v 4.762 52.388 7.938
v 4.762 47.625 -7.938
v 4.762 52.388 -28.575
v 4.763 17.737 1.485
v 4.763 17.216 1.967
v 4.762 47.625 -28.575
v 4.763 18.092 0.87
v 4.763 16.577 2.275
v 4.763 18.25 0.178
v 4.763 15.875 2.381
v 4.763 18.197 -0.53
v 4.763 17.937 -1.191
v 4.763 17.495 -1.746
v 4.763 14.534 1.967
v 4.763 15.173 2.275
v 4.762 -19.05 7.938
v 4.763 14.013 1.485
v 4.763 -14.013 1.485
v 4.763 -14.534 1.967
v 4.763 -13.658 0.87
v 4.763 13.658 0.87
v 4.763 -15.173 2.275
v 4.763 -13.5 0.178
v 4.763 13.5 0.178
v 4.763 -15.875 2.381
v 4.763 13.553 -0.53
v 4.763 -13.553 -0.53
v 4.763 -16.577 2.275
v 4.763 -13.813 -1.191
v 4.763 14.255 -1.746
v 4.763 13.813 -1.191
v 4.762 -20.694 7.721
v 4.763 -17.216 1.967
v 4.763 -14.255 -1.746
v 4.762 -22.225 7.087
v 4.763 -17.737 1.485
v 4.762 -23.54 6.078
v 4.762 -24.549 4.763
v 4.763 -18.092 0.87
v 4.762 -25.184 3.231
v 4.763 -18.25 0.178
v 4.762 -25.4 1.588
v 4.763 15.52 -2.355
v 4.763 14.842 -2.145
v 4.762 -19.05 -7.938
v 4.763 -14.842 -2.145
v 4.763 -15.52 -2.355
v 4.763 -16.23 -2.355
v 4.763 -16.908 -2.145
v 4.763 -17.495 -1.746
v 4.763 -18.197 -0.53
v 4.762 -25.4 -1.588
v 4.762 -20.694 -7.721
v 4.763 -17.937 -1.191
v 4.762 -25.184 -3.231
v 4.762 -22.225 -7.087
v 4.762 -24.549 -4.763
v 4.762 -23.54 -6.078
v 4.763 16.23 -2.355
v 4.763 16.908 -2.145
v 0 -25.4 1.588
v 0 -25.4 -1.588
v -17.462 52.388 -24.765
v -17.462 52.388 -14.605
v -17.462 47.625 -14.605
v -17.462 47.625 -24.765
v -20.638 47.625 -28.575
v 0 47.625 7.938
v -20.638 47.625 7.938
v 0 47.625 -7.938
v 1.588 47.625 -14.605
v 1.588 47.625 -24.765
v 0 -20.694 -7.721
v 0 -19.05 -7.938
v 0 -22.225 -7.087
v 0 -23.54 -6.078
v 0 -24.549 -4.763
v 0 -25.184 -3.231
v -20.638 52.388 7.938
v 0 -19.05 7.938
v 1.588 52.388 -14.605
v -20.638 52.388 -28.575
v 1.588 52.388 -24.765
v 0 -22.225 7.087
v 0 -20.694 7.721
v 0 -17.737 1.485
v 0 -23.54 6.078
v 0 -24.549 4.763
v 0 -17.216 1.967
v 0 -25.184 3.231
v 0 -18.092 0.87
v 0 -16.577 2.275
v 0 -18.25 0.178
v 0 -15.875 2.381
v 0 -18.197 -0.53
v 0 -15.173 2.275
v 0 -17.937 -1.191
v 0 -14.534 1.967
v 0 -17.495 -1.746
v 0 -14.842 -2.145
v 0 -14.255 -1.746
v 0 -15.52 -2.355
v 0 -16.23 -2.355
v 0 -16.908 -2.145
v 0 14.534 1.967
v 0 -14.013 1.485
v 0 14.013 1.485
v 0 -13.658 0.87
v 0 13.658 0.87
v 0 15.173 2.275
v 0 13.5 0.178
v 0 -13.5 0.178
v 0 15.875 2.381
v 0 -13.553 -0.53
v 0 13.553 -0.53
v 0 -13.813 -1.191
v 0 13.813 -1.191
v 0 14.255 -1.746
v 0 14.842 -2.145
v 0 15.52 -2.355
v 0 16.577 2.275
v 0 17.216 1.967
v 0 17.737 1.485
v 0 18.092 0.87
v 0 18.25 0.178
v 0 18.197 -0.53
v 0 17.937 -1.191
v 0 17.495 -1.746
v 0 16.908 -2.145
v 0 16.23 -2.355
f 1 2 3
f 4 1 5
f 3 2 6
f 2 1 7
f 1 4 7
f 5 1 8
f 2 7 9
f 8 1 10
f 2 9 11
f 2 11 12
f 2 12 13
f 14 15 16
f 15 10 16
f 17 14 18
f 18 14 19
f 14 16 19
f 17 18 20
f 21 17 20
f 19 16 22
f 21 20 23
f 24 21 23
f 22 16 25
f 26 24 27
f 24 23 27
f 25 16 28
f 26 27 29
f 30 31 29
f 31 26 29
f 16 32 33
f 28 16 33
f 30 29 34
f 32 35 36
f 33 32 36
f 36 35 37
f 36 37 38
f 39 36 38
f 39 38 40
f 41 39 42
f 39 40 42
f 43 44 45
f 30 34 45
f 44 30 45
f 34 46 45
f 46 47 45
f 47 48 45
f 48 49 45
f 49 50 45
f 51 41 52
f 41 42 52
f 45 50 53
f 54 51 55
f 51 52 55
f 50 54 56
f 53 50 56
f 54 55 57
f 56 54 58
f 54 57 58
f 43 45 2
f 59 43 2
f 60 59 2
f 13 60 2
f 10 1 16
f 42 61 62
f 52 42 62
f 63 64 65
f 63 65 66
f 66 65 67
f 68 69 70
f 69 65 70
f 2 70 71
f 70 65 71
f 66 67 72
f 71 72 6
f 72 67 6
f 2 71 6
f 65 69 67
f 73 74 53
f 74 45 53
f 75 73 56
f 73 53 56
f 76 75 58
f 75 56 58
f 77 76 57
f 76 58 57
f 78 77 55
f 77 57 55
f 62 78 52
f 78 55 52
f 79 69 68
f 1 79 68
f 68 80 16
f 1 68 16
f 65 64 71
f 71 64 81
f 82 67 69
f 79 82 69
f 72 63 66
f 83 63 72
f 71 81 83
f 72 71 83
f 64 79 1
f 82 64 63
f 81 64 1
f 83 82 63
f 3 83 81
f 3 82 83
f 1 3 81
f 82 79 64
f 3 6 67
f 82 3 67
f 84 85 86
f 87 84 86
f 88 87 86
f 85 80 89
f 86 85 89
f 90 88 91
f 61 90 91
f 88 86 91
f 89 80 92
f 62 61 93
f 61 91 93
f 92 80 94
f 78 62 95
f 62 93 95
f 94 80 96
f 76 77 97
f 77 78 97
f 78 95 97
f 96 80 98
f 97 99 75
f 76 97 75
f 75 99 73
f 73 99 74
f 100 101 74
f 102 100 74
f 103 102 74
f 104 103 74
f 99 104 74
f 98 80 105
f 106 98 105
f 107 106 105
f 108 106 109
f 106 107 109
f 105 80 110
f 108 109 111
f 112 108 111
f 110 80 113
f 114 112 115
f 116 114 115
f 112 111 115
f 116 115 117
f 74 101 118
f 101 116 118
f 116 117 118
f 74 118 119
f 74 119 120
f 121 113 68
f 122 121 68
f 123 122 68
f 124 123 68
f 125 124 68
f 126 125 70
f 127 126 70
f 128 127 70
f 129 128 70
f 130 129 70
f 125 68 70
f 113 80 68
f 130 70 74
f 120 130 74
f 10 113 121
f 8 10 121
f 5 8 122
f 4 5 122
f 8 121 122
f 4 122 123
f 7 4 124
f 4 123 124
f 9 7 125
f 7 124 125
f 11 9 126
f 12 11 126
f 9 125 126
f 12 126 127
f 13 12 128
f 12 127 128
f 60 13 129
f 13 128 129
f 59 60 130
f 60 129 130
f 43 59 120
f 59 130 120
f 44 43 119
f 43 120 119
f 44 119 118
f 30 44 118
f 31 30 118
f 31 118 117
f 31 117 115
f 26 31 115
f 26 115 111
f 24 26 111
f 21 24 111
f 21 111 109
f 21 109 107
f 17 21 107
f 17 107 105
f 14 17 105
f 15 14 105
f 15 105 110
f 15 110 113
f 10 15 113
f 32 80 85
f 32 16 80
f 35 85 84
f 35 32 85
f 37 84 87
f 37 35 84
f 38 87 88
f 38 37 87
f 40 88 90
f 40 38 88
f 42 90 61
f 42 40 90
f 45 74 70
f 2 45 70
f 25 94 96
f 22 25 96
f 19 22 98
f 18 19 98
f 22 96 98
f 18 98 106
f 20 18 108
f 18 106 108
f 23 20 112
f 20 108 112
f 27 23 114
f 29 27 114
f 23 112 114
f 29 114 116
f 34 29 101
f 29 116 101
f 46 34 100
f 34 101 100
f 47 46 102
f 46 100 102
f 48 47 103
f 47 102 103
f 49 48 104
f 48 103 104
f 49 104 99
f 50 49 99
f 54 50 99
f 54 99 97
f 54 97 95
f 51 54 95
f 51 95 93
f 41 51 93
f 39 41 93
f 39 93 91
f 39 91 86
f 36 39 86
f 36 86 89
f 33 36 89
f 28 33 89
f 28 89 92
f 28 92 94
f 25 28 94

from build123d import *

# Parameters (mm, degrees)
SKETCH1_W                      = 15.875
SKETCH1_H                      = 22.225
SKETCH1_H_2                    = 50.8
BOSS_EXTRUDE1_DEPTH            = 4.7625
F_3_16_0_1875_DIAMETER_HOLE1_D = 4.7625
SKETCH5_W                      = 4.7625
SKETCH5_H                      = 15.875
BOSS_EXTRUDE2_DEPTH            = 4.7625
FILLET1_R                      = 6.35
SKETCH7_W                      = 19.05
SKETCH7_H                      = 10.16
CUT_EXTRUDE1_DEPTH             = 78.7875


with BuildPart() as part:
    # Sketch1 → Boss-Extrude1 (new body)
    with BuildSketch(Plane(origin=(0, 0, 0), x_dir=(0, 0, -1), z_dir=(1, 0, 0))):
        with Locations((0, 36.5125)):
            Rectangle(SKETCH1_W, SKETCH1_H)
        Rectangle(SKETCH1_W, SKETCH1_H_2)
    extrude(amount=BOSS_EXTRUDE1_DEPTH)

    # 3/16 (0.1875) Diameter Hole1 (through all)
    with Locations(Plane(origin=(4.7625, 0, 0), x_dir=(0, 0, -1), z_dir=(1, 0, 0))):
        with Locations((0, -15.875), (0, 15.875)):
            Hole(F_3_16_0_1875_DIAMETER_HOLE1_D / 2)

    # Sketch5 → Boss-Extrude2 (add)
    with BuildSketch(Plane(origin=(0, 47.625, 0), x_dir=(1, 0, 0), z_dir=(0, 1, 0))):
        Polygon((-20.6375, -7.9375), (0, -7.9375), (0, 7.9375), (4.7625, 7.9375), (4.7625, 28.575), (-20.6375, 28.575), align=None)
        with Locations((2.38125, 0)):
            Rectangle(SKETCH5_W, SKETCH5_H)
    extrude(amount=BOSS_EXTRUDE2_DEPTH)

    # Fillet1
    fillet1_edges = [part.edges().sort_by_distance(p)[0] for p in [
        (2.38125, -25.4, 7.9375),
        (2.38125, -25.4, -7.9375),
    ]]
    fillet(fillet1_edges, radius=FILLET1_R)

    # Sketch7 → Cut-Extrude1 (cut, through all)
    with BuildSketch(Plane(origin=(0, 52.3875, 0), x_dir=(1, 0, 0), z_dir=(0, 1, 0))):
        with Locations((-7.9375, 19.685)):
            Rectangle(SKETCH7_W, SKETCH7_H)
    extrude(amount=-CUT_EXTRUDE1_DEPTH, mode=Mode.SUBTRACT)


solid = part.part
